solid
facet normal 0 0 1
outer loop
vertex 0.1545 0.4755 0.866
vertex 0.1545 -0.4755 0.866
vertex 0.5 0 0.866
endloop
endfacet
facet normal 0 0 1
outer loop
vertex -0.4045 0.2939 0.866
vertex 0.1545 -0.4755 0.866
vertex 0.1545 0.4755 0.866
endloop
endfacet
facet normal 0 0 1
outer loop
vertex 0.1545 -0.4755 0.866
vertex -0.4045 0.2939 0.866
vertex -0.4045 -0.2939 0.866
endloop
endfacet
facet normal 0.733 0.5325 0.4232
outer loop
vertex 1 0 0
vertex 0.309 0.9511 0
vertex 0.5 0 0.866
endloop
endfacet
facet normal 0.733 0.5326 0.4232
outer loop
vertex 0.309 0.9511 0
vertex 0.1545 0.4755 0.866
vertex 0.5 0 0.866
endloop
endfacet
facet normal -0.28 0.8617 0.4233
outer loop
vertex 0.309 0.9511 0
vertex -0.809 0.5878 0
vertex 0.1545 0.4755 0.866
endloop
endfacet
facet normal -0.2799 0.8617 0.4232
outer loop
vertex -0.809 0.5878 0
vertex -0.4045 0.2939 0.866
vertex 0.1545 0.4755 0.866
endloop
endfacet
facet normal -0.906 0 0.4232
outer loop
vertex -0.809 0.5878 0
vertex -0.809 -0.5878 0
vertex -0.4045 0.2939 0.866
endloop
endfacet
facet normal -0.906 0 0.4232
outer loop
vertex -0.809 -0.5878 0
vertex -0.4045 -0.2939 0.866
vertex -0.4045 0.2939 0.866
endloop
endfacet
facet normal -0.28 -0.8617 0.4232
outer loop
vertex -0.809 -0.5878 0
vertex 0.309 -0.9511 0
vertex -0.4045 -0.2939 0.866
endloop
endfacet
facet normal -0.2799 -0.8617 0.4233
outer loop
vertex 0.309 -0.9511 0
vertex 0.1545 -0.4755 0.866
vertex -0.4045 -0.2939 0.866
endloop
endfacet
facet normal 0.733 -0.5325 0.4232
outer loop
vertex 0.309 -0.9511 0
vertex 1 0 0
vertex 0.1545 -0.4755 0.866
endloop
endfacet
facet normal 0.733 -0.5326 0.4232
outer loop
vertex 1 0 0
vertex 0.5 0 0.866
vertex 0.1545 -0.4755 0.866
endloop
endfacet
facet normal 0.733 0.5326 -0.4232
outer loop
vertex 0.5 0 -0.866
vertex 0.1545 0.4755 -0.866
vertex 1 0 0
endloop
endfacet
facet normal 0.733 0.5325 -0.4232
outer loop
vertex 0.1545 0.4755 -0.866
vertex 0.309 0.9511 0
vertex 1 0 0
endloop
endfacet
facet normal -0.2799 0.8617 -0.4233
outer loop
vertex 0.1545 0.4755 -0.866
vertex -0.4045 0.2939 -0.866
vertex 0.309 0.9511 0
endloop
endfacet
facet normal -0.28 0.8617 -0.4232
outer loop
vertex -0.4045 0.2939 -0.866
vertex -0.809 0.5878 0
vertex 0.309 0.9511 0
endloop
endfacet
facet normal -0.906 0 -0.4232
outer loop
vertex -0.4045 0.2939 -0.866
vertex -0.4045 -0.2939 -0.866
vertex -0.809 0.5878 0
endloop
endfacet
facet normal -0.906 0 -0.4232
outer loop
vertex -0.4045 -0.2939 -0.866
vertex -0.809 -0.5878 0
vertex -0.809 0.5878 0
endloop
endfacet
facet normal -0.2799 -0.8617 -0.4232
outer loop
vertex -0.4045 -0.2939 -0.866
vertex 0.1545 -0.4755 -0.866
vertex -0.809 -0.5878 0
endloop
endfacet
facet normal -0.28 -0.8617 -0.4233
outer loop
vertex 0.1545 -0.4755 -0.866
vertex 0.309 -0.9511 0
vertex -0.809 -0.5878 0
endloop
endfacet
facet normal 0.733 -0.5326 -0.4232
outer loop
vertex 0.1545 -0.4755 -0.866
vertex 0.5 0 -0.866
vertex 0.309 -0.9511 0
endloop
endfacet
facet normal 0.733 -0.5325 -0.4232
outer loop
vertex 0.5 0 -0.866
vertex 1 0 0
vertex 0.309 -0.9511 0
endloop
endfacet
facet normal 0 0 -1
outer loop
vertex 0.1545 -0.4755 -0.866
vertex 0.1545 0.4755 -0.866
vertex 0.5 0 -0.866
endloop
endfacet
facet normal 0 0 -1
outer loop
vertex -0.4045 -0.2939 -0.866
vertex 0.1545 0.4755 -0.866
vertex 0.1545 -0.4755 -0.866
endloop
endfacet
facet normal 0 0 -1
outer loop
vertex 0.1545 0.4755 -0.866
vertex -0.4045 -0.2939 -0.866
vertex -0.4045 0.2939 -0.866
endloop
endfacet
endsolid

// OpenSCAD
module c(i) children(i);
c(5) { cube(); }
c(-1) { cube(); }
c("a") cube();
c(1.7) { cube(); sphere(); }
module none() children();
none();
